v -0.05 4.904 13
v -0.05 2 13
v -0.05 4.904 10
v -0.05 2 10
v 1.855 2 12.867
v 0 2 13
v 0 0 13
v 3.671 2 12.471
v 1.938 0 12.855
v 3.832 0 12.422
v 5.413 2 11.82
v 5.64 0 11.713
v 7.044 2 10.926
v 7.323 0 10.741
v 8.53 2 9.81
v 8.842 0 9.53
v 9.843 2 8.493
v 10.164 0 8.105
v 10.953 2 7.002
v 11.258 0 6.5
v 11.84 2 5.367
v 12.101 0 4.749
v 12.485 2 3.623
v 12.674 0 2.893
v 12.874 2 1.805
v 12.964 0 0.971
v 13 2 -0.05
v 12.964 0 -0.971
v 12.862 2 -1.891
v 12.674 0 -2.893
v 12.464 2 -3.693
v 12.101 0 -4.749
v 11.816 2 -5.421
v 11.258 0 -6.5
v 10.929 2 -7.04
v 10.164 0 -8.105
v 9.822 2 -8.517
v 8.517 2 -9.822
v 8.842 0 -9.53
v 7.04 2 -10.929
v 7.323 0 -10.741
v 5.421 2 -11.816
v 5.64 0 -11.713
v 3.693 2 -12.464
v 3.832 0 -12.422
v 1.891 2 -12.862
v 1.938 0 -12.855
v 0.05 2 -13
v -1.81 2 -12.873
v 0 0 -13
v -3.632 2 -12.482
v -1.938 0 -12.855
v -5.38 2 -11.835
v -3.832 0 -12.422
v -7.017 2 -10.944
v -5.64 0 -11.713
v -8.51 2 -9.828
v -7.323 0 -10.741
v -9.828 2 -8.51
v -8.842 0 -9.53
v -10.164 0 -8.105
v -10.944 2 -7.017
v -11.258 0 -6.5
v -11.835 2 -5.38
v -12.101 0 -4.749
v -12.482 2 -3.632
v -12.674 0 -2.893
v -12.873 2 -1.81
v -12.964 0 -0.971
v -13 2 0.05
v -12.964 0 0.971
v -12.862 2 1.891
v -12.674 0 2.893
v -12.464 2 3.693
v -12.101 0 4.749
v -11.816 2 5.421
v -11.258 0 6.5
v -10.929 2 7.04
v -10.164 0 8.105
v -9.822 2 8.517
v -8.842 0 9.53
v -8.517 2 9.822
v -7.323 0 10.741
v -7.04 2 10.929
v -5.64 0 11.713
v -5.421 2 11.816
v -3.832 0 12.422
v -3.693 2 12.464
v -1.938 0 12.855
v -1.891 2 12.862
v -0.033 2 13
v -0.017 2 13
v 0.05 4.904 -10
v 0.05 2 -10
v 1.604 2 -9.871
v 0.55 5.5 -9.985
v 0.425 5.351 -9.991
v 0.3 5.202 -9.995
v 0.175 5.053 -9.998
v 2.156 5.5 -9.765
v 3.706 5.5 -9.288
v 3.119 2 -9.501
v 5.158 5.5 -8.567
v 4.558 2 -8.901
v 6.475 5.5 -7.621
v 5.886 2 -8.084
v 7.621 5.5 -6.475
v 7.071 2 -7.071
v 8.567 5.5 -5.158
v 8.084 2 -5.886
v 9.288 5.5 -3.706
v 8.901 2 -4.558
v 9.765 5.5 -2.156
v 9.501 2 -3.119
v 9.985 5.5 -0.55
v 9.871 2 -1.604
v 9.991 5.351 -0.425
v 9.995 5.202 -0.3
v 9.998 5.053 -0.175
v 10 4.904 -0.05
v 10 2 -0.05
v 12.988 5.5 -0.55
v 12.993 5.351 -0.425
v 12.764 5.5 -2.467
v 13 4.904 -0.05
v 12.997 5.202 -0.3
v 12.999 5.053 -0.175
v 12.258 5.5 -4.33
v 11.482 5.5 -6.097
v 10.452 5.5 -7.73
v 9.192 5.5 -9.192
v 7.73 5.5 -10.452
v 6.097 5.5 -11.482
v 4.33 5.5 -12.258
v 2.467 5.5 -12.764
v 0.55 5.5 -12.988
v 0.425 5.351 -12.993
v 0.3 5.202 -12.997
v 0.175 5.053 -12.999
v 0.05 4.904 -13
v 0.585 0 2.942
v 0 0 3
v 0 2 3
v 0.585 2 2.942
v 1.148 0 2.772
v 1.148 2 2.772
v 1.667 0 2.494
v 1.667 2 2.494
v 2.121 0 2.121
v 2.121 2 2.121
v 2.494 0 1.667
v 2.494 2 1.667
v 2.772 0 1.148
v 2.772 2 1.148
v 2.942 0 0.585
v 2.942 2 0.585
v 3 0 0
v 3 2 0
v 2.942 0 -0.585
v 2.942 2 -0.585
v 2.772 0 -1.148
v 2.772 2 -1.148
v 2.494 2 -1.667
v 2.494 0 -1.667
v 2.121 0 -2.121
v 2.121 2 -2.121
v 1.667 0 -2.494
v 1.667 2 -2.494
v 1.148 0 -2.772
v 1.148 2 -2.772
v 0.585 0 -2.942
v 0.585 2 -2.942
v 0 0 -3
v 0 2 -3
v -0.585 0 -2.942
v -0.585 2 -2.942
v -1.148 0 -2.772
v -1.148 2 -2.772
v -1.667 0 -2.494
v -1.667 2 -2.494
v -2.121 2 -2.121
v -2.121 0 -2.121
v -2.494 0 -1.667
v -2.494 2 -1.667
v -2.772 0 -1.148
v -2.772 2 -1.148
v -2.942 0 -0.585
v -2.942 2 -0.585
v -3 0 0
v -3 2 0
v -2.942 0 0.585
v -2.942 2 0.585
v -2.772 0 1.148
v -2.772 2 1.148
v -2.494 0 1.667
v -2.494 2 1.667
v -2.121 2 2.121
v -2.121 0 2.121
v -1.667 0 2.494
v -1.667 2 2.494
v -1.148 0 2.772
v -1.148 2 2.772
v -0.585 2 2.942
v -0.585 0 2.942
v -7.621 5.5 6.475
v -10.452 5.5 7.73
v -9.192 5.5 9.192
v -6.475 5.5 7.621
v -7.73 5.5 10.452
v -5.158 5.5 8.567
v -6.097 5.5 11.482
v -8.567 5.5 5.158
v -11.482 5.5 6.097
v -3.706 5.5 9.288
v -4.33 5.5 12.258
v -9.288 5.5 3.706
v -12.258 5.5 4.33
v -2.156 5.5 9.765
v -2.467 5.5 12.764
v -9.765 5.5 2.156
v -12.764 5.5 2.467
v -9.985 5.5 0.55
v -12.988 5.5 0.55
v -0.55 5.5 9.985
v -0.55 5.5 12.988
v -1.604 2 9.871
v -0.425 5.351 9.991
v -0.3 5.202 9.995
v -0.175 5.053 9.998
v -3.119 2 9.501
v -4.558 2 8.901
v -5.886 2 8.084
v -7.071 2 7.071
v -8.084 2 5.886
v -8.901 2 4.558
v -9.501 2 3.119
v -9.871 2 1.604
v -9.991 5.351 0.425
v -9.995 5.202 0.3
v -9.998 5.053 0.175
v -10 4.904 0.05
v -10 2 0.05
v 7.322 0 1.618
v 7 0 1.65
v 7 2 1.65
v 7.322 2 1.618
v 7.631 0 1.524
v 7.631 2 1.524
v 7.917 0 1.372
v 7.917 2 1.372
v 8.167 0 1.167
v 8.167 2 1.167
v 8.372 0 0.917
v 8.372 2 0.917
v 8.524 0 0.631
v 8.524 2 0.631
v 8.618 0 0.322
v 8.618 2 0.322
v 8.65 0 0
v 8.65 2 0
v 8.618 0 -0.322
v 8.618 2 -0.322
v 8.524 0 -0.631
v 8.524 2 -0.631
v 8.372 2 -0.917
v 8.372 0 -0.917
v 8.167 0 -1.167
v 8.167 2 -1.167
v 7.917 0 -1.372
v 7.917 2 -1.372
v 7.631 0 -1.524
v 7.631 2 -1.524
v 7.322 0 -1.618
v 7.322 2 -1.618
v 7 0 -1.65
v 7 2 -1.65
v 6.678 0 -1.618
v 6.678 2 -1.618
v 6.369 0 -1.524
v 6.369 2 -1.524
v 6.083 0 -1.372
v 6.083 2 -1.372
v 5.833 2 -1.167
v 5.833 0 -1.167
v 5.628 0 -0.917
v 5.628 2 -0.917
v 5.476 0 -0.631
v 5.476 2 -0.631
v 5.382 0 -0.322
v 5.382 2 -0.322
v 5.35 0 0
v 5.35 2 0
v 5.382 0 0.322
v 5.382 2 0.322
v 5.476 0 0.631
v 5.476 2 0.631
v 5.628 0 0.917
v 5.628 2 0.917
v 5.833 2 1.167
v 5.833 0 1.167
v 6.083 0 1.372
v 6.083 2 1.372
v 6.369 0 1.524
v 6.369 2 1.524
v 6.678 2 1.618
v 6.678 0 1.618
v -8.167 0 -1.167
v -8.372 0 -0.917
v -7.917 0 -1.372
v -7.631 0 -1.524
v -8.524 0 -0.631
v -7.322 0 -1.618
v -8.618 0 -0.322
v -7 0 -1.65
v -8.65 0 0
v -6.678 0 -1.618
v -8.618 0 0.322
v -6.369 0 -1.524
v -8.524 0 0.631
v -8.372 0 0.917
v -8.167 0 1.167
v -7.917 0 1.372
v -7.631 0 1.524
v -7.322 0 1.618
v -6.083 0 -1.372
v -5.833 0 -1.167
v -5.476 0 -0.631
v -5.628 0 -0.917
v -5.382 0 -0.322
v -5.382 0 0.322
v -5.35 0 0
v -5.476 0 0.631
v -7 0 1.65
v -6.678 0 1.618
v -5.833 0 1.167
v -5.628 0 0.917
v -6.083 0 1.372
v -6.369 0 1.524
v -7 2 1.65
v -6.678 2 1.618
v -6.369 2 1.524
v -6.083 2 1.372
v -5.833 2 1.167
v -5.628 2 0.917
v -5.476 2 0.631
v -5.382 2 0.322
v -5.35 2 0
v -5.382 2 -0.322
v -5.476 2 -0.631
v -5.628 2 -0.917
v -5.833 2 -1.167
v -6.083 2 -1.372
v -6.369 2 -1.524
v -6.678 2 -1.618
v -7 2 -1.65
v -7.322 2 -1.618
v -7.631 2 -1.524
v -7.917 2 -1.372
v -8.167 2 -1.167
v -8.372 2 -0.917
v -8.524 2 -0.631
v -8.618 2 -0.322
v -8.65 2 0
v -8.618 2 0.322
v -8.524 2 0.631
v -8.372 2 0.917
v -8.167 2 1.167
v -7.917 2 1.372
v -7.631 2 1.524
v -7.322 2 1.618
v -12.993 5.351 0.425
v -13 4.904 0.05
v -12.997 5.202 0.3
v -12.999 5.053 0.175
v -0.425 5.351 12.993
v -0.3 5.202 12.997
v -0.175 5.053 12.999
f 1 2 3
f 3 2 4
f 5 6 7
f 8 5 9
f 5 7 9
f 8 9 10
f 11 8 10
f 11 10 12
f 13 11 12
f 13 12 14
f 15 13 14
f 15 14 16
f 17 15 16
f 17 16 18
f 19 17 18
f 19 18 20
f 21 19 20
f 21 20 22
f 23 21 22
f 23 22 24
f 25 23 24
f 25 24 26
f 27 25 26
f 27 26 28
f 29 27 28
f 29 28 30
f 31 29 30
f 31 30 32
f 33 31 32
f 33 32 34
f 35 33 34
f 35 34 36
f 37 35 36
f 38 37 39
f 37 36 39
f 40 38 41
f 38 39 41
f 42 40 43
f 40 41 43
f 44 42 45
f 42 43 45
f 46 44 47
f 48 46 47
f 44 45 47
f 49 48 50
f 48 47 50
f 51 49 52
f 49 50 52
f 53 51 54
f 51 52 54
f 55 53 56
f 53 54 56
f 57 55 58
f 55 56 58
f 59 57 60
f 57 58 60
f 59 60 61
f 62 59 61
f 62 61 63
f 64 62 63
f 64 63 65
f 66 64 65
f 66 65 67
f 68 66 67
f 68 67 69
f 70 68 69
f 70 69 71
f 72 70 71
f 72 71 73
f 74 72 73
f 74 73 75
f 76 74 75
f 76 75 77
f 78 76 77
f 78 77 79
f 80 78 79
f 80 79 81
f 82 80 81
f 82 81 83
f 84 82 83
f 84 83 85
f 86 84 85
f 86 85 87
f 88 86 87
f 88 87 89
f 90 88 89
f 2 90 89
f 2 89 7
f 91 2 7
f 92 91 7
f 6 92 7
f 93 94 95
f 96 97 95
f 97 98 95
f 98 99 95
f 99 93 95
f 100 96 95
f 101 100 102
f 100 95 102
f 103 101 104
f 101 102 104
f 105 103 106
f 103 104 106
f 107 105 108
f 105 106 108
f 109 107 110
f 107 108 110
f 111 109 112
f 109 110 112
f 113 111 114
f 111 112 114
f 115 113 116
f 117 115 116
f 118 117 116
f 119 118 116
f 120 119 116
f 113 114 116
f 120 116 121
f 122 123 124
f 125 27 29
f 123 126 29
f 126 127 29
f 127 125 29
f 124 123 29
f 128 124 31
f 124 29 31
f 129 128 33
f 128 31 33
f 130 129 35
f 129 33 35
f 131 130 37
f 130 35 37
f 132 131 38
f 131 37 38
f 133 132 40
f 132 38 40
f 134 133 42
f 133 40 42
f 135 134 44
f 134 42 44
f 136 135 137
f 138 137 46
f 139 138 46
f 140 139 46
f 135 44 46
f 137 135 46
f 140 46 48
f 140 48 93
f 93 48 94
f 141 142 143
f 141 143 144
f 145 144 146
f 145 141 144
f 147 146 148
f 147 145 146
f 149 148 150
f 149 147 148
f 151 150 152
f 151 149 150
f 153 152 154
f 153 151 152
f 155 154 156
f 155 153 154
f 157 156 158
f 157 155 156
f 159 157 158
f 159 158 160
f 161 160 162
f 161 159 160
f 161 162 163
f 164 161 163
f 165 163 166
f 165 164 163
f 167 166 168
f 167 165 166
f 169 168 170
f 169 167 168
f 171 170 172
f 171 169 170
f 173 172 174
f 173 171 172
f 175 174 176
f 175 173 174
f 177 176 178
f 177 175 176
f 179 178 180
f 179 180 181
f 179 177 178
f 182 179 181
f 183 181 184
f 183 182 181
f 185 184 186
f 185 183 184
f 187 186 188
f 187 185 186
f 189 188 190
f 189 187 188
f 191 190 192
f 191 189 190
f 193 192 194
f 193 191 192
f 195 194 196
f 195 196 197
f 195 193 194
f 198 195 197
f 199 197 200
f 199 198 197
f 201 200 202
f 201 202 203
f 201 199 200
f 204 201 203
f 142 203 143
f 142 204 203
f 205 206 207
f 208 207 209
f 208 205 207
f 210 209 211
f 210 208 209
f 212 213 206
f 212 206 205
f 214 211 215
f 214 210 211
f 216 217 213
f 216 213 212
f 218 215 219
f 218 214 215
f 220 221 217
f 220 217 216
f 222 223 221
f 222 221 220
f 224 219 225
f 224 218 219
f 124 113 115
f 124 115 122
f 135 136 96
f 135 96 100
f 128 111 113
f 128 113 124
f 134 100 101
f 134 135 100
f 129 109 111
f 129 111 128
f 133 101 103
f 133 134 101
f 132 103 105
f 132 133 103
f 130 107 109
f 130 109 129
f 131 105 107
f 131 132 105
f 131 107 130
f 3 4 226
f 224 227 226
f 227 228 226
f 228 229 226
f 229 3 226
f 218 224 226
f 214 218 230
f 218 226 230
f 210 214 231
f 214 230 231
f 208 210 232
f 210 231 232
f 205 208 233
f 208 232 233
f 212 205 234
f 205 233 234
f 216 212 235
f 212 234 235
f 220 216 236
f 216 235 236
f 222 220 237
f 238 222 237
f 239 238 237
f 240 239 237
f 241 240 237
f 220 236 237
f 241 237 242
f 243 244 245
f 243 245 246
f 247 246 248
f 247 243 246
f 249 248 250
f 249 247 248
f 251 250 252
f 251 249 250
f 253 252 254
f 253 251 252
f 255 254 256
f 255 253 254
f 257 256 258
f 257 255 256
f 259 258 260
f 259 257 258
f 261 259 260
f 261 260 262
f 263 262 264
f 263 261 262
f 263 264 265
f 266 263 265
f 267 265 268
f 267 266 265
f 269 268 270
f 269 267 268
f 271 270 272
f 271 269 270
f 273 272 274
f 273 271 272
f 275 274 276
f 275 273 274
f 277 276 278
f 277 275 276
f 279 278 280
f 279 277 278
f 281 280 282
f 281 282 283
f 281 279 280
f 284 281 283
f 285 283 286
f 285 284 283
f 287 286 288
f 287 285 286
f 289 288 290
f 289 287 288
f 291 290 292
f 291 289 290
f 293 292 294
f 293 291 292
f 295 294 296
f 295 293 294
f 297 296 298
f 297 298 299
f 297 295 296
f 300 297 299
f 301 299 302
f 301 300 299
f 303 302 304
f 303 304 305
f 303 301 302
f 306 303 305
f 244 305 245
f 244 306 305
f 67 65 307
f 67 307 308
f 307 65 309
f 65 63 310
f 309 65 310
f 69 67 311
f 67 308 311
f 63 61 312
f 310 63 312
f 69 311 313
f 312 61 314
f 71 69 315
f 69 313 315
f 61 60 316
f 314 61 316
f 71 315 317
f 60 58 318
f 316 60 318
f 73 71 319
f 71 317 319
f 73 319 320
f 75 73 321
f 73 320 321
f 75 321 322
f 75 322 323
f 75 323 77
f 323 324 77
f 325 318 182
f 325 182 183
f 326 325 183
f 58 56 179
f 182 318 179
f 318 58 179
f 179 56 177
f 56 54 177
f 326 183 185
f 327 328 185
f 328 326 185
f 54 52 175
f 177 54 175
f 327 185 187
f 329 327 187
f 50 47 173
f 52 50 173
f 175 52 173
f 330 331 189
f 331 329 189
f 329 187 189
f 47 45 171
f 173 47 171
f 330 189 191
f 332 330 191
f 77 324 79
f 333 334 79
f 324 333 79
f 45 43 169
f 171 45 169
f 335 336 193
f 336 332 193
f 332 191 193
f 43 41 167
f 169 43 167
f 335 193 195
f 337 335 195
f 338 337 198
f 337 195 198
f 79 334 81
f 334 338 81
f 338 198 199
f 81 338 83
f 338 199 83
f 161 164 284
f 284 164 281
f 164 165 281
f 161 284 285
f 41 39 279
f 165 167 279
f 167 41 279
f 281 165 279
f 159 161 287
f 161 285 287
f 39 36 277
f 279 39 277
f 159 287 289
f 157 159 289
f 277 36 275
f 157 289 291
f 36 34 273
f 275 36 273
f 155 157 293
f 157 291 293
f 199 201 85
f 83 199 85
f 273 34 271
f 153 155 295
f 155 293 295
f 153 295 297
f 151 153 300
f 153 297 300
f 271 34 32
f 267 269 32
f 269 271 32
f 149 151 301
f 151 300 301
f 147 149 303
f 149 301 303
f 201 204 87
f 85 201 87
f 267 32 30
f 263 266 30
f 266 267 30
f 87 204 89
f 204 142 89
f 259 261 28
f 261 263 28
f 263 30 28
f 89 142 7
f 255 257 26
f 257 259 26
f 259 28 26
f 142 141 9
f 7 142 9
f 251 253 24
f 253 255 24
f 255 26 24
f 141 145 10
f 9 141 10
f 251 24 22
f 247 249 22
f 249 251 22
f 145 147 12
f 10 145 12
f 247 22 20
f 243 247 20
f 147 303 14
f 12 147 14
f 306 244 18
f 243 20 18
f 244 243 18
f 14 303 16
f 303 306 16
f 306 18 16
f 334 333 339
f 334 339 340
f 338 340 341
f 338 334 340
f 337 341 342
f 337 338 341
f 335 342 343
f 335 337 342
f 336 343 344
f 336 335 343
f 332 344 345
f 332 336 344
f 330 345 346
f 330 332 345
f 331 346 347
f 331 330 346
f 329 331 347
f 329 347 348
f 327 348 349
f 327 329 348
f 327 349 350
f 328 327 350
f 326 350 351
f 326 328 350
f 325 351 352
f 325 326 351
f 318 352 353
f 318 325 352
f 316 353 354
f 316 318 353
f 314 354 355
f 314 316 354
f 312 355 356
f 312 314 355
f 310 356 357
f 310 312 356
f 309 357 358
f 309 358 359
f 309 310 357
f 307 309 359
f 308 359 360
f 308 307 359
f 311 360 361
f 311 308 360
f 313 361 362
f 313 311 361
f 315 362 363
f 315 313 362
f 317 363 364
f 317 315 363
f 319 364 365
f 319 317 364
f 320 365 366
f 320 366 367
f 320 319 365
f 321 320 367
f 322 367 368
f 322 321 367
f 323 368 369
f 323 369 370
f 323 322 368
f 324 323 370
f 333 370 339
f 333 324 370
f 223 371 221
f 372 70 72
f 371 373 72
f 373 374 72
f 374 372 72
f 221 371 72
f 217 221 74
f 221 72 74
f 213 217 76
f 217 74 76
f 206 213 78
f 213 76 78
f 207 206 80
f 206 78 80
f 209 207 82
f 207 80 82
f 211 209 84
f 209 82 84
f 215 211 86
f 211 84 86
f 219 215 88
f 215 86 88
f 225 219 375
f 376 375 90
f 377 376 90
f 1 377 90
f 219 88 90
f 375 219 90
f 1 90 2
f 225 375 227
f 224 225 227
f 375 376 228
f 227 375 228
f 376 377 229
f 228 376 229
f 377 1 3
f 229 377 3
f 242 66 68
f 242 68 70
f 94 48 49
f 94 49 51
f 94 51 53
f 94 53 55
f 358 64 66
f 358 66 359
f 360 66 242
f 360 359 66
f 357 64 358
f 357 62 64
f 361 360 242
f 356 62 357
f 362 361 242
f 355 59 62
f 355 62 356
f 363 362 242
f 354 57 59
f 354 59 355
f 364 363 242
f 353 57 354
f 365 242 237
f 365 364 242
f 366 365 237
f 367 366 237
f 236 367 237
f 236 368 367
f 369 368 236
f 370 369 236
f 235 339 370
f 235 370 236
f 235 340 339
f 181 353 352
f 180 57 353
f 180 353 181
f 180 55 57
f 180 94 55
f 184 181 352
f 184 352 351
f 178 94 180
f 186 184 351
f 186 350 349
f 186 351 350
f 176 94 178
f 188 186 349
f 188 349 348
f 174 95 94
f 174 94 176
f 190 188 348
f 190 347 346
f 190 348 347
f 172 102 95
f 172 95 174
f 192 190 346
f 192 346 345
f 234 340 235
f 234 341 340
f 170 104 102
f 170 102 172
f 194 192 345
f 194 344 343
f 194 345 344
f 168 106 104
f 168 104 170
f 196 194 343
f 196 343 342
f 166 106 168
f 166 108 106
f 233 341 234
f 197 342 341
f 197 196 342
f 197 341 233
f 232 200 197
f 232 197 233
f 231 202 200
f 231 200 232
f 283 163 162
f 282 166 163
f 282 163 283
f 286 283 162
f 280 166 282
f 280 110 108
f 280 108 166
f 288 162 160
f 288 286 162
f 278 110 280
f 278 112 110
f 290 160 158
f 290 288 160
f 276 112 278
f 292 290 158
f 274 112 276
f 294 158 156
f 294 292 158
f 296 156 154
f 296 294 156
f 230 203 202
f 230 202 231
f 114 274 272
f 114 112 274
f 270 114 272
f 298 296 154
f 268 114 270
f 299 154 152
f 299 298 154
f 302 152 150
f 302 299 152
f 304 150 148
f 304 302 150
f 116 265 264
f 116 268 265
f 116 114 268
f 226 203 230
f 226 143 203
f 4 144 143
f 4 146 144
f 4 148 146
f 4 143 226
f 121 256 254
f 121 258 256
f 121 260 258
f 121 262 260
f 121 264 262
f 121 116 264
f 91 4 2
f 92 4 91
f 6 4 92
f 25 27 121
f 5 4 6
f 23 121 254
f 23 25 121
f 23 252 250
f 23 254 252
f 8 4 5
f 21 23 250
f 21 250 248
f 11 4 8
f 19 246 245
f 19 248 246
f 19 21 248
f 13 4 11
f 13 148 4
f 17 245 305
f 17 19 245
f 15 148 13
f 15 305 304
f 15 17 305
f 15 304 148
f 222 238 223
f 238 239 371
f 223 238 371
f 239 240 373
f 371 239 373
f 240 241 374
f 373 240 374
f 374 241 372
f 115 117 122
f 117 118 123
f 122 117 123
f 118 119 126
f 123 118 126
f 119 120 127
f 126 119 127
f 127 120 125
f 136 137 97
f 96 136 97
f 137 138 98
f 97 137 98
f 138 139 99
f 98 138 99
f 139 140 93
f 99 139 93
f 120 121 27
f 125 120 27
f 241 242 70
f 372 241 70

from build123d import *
from OCP.BRepFilletAPI import BRepFilletAPI_MakeChamfer

# Parameters (mm, degrees)
SKETCH_1_R      = 13
SKETCH_1_R_2    = 1.65
SKETCH_1_R_3    = 3
EXTRUDE_1_DEPTH = 2
EXTRUDE_2_DEPTH = 3.5
CHAMFER_1_SIZE  = 0.5
CHAMFER_1_SIZE2 = 0.595876796


with BuildPart() as part:
    # 草图1 → 凸台-拉伸1 (new body)
    with BuildSketch(Plane(origin=(0, 0, 0), x_dir=(1, 0, 0), z_dir=(0, 1, 0))):
        with Locations(Location((0, 0, 0), (0, 0, 270))):
            Circle(SKETCH_1_R)
        with Locations(Location((7, 0, 0), (0, 0, 270))):
            Circle(SKETCH_1_R_2, mode=Mode.SUBTRACT)
        with Locations(Location((-7, 0, 0), (0, 0, 270))):
            Circle(SKETCH_1_R_2, mode=Mode.SUBTRACT)
        with Locations(Location((0, 0, 0), (0, 0, 270))):
            Circle(SKETCH_1_R_3, mode=Mode.SUBTRACT)
    extrude(amount=EXTRUDE_1_DEPTH)

    # 草图2 → 凸台-拉伸2 (add)
    with BuildSketch(Plane(origin=(0, 2, 0), x_dir=(1, 0, 0), z_dir=(0, 1, 0))):
        with BuildLine():
            ThreePointArc((12.999903846, 0.05), (9.192388155, 9.192388155), (0.05, 12.999903846))
            Line((0.05, 12.999903846), (0.05, 9.999874999))
            ThreePointArc((0.05, 9.999874999), (7.071067812, 7.071067812), (9.999874999, 0.05))
            Line((9.999874999, 0.05), (12.999903846, 0.05))
        make_face()
        with BuildLine():
            Line((-9.999874999, -0.05), (-12.999903846, -0.05))
            ThreePointArc((-12.999903846, -0.05), (-9.192388155, -9.192388155), (-0.05, -12.999903846))
            Line((-0.05, -12.999903846), (-0.05, -9.999874999))
            ThreePointArc((-0.05, -9.999874999), (-7.071067812, -7.071067812), (-9.999874999, -0.05))
        make_face()
    extrude(amount=EXTRUDE_2_DEPTH)

    # 倒角1: one chamfer whose edges measure the first distance from different faces: ONE call of the kernel's chamfer builder (chamfer() names one face for all edges)
    chamfer_1_edges_1 = [part.edges().sort_by_distance(p)[0] for p in [
        (11.499889423, 5.5, -0.05),
        (0.05, 5.5, -11.499889423),
    ]]
    chamfer_1_side_1 = [part.faces().sort_by_distance(p)[0] for p in [
        (7.371553631, 5.5, -7.371553631),
    ]]
    chamfer_1_edges_2 = [part.edges().sort_by_distance(p)[0] for p in [
        (-11.499889423, 5.5, 0.05),
        (-0.05, 5.5, 11.499889423),
    ]]
    chamfer_1_side_2 = [part.faces().sort_by_distance(p)[0] for p in [
        (-7.371553631, 5.5, 7.371553631),
    ]]
    chamfer_1 = BRepFilletAPI_MakeChamfer(part.part.solid().wrapped)
    for e in chamfer_1_edges_1:
        chamfer_1.Add(CHAMFER_1_SIZE, CHAMFER_1_SIZE2, e.wrapped, chamfer_1_side_1[0].wrapped)  # the first distance lies on this face
    for e in chamfer_1_edges_2:
        chamfer_1.Add(CHAMFER_1_SIZE, CHAMFER_1_SIZE2, e.wrapped, chamfer_1_side_2[0].wrapped)  # the first distance lies on this face
    add(Compound.cast(chamfer_1.Shape()), mode=Mode.REPLACE)


solid = part.part
